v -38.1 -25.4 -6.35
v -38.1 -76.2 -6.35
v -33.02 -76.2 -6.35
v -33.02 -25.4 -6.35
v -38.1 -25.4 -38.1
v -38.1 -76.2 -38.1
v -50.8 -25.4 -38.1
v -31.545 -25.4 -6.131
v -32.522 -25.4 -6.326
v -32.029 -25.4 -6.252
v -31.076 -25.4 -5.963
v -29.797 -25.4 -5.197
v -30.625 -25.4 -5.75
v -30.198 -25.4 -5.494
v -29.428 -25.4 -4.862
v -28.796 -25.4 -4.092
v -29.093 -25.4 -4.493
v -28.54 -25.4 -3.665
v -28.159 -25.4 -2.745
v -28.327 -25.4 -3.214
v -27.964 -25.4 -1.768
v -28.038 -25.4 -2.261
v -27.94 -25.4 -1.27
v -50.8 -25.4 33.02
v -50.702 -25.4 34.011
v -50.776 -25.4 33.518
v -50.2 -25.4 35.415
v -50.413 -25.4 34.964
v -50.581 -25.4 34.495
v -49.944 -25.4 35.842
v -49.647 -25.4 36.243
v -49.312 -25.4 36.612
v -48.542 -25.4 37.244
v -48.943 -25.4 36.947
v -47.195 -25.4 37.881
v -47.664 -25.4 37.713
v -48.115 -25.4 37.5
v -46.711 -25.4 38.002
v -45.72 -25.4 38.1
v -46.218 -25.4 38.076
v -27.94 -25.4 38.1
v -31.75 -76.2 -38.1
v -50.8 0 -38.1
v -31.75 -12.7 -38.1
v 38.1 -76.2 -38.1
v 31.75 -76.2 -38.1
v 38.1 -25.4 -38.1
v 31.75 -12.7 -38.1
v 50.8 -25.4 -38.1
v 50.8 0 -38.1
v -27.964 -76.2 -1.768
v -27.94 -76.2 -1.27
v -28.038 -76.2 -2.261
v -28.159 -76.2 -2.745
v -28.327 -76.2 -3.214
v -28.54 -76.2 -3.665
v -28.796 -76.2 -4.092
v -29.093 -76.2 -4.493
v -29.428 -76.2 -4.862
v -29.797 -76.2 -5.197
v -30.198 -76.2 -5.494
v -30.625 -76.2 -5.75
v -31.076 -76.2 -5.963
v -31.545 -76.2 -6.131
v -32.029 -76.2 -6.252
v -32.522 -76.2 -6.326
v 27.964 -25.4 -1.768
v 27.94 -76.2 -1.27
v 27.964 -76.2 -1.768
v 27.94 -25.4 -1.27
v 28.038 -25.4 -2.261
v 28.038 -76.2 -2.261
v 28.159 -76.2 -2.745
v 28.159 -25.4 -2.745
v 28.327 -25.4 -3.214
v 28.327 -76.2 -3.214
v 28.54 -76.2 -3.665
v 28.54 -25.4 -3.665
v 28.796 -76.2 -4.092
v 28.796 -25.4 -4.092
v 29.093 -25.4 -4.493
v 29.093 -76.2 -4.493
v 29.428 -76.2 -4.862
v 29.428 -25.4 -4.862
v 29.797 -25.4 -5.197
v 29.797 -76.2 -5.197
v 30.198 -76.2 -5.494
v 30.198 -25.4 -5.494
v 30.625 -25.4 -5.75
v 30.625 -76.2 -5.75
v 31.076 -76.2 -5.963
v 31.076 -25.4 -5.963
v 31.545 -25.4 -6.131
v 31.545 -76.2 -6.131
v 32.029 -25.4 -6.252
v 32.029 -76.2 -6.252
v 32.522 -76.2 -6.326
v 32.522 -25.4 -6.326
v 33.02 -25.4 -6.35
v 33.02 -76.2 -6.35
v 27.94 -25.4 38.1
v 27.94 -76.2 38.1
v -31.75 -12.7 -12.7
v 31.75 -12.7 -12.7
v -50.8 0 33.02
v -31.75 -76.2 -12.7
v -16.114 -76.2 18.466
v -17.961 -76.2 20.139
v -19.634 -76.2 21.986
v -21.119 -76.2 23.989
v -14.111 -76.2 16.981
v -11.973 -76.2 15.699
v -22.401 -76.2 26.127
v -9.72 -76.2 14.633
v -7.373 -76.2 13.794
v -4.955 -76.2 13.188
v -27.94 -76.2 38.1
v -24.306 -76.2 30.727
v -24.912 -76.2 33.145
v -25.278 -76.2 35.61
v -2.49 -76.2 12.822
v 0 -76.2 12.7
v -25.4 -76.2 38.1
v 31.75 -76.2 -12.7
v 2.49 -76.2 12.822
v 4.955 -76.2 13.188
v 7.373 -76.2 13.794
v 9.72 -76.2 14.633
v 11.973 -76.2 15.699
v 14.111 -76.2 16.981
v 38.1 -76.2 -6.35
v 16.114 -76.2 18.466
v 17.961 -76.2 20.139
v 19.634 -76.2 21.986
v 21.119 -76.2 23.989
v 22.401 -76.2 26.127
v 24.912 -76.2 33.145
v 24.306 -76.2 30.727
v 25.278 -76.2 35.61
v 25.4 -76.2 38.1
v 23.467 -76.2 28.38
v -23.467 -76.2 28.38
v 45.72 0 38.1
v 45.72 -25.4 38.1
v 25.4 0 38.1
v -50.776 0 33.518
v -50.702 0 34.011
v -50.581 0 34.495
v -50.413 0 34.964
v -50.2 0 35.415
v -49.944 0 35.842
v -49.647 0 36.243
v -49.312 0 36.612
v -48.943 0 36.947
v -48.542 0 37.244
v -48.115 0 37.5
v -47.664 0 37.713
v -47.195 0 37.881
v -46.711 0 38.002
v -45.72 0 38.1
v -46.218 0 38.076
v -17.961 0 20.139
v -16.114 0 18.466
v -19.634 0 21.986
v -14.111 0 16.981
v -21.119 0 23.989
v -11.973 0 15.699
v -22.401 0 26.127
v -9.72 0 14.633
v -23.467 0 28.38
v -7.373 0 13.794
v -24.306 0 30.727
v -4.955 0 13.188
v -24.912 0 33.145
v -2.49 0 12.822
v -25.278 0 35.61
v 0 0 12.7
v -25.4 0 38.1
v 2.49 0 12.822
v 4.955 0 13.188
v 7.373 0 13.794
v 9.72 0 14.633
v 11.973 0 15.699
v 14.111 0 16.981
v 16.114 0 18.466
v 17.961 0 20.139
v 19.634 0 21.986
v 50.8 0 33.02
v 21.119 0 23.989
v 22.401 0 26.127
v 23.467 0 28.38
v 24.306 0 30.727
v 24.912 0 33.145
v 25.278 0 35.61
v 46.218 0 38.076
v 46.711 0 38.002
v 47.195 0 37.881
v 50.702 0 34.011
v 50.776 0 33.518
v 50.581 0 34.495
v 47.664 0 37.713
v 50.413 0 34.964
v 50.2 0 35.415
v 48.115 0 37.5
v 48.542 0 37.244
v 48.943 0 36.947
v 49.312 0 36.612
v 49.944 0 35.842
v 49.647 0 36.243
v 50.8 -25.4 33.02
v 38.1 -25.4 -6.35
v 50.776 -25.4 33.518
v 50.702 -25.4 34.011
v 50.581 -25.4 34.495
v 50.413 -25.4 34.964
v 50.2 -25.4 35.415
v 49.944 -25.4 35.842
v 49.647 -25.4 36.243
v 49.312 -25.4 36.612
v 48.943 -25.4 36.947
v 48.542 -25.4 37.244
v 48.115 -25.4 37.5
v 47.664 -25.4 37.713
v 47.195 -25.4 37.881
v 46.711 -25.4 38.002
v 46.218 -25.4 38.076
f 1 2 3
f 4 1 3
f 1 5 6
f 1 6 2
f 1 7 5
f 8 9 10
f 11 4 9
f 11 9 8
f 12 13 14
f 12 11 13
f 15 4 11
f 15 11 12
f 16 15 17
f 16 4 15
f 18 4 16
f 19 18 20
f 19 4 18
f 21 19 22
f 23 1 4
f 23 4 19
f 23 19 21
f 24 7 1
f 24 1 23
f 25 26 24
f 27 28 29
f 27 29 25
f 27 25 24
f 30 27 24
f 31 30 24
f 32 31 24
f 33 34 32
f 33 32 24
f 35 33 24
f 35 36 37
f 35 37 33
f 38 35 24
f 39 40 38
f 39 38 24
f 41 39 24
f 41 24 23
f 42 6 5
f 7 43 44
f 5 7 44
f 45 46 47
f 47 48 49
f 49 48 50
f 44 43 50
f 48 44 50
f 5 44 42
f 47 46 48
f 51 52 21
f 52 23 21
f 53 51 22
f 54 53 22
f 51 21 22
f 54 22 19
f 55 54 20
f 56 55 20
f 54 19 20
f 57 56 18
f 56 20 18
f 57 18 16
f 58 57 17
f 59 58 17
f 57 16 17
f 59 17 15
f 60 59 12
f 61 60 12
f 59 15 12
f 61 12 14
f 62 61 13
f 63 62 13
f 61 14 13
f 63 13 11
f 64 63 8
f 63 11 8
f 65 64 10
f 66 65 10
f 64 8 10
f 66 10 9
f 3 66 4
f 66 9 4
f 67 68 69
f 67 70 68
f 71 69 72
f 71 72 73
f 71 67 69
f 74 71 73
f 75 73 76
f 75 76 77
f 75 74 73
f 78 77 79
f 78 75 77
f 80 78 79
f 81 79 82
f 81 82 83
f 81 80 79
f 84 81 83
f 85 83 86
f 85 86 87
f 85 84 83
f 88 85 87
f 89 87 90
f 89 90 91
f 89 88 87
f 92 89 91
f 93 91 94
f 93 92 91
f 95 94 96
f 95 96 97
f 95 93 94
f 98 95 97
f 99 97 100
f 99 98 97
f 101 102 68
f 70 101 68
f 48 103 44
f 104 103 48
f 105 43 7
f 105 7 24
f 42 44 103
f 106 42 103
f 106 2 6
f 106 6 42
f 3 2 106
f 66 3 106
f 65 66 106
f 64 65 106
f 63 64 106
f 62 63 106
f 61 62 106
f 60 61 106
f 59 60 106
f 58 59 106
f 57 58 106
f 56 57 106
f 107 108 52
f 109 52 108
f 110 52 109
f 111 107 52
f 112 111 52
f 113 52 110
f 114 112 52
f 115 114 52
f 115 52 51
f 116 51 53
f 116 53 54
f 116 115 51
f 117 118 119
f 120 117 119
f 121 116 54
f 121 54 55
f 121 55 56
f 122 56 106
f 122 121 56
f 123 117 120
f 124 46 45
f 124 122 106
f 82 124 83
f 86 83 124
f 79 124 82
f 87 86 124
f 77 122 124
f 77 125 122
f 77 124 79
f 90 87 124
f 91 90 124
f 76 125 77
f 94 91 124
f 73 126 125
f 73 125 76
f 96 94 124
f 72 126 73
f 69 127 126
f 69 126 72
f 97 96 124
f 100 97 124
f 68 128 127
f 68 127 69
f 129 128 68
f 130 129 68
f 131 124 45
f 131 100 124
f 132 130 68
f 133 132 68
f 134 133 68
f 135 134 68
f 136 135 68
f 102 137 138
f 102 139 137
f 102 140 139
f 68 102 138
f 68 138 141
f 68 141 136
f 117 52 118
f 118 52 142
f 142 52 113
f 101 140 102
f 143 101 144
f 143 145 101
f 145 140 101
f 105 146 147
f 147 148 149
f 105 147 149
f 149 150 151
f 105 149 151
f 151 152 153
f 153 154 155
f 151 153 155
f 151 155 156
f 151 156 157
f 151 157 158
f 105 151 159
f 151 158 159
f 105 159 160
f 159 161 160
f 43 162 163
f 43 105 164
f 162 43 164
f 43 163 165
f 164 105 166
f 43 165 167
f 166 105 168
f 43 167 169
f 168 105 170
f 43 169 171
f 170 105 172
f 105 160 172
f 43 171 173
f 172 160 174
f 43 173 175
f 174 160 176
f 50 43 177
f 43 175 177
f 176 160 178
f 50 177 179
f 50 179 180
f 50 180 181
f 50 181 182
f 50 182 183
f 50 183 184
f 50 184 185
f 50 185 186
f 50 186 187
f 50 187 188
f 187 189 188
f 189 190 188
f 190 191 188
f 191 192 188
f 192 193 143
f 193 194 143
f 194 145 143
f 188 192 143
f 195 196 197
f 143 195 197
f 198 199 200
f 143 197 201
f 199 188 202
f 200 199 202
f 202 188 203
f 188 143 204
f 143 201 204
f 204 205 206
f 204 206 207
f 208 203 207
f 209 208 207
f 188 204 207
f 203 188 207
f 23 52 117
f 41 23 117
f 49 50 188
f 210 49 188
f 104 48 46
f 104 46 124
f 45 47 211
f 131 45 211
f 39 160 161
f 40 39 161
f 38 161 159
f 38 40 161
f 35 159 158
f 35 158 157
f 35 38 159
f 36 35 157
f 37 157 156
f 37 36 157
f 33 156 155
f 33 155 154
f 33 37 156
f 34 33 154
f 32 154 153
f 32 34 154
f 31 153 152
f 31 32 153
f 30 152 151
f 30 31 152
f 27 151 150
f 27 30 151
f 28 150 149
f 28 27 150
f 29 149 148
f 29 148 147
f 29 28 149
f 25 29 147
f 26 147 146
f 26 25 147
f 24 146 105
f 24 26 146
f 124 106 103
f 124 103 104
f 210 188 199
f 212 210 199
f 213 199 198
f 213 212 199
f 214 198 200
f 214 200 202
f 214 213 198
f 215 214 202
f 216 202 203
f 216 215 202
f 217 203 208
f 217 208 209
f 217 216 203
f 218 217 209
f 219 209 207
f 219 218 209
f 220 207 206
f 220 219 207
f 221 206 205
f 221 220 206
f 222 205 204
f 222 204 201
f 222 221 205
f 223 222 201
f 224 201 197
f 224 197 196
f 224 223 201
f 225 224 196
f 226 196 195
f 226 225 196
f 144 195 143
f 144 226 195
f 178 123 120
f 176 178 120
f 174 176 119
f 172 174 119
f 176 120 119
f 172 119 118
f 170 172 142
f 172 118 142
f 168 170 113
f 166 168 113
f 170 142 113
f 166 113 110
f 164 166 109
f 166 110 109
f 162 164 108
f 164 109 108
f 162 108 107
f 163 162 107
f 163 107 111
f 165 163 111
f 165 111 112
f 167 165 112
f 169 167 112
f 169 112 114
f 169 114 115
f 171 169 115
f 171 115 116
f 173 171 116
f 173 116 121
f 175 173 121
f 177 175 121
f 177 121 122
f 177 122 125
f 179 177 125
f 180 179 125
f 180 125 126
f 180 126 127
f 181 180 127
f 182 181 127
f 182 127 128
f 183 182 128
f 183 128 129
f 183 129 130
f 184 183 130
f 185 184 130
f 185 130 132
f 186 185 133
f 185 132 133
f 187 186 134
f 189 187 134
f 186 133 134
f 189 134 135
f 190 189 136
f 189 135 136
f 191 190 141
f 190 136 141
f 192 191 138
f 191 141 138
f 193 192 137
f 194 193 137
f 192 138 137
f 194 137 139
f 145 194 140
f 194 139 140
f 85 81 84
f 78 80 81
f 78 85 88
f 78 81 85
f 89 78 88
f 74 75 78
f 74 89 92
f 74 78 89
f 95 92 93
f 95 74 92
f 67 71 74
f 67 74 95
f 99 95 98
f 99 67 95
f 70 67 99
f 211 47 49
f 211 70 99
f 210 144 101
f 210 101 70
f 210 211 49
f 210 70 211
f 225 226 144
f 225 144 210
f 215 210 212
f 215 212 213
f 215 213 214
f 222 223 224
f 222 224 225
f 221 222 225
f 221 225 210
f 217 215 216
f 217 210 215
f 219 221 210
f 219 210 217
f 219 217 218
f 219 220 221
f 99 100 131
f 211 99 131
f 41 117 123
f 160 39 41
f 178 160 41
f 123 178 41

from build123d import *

# Parameters (mm, degrees)
F0_W     = 101.6
F0_H     = 76.2
F1_DEPTH = 76.2
F3_DEPTH = 76.201
F2_W     = 63.5
F2_H     = 25.4
F4_DEPTH = 63.5
F2_W_2   = 12.7
F2_H_2   = 31.75
F5_DEPTH = 50.8
F6_R     = 5.08
F7_R     = 5.08


with BuildPart() as f1:
    # F0 (on Front) → F1 (new body)
    with BuildSketch(Plane.XZ):
        Rectangle(F0_W, F0_H)
    extrude(amount=F1_DEPTH)

    # F2 (on face) → F3 (cut, through all)
    with BuildSketch(Plane.XZ.offset(76.2)):
        with BuildLine():
            ThreePointArc((-25.4, 38.1), (0, 12.7), (25.4, 38.1))
            Line((25.4, 38.1), (-25.4, 38.1))
        make_face()
    extrude(amount=-F3_DEPTH, mode=Mode.SUBTRACT)

    # F2 (on face) → F4 (cut)
    with BuildSketch(Plane.XZ.offset(76.2)):
        with Locations((0, -25.4)):
            Rectangle(F2_W, F2_H)
    extrude(amount=-F4_DEPTH, mode=Mode.SUBTRACT)

    # F2 (on face) → F5 (cut)
    with BuildSketch(Plane.XZ.offset(76.2)):
        Polygon((50.8, 38.1), (27.94, 38.1), (27.94, -6.35), (38.1, -6.35), (50.8, -6.35), align=None)
        with Locations((44.45, -22.225)):
            Rectangle(F2_W_2, F2_H_2)
        Polygon((-27.94, -6.35), (-27.94, 38.1), (-50.8, 38.1), (-50.8, -6.35), (-38.1, -6.35), align=None)
        with Locations((-44.45, -22.225)):
            Rectangle(F2_W_2, F2_H_2)
    extrude(amount=-F5_DEPTH, mode=Mode.SUBTRACT)

    # F6
    f6_edges = [f1.edges().sort_by_distance(p)[0] for p in [
        (27.94, -50.8, -6.35),
        (-27.94, -50.8, -6.35),
    ]]
    fillet(f6_edges, radius=F6_R)

    # F7
    f7_edges = [f1.edges().sort_by_distance(p)[0] for p in [
        (50.8, -12.7, 38.1),
        (-50.8, -12.7, 38.1),
    ]]
    fillet(f7_edges, radius=F7_R)


solid = f1.part
